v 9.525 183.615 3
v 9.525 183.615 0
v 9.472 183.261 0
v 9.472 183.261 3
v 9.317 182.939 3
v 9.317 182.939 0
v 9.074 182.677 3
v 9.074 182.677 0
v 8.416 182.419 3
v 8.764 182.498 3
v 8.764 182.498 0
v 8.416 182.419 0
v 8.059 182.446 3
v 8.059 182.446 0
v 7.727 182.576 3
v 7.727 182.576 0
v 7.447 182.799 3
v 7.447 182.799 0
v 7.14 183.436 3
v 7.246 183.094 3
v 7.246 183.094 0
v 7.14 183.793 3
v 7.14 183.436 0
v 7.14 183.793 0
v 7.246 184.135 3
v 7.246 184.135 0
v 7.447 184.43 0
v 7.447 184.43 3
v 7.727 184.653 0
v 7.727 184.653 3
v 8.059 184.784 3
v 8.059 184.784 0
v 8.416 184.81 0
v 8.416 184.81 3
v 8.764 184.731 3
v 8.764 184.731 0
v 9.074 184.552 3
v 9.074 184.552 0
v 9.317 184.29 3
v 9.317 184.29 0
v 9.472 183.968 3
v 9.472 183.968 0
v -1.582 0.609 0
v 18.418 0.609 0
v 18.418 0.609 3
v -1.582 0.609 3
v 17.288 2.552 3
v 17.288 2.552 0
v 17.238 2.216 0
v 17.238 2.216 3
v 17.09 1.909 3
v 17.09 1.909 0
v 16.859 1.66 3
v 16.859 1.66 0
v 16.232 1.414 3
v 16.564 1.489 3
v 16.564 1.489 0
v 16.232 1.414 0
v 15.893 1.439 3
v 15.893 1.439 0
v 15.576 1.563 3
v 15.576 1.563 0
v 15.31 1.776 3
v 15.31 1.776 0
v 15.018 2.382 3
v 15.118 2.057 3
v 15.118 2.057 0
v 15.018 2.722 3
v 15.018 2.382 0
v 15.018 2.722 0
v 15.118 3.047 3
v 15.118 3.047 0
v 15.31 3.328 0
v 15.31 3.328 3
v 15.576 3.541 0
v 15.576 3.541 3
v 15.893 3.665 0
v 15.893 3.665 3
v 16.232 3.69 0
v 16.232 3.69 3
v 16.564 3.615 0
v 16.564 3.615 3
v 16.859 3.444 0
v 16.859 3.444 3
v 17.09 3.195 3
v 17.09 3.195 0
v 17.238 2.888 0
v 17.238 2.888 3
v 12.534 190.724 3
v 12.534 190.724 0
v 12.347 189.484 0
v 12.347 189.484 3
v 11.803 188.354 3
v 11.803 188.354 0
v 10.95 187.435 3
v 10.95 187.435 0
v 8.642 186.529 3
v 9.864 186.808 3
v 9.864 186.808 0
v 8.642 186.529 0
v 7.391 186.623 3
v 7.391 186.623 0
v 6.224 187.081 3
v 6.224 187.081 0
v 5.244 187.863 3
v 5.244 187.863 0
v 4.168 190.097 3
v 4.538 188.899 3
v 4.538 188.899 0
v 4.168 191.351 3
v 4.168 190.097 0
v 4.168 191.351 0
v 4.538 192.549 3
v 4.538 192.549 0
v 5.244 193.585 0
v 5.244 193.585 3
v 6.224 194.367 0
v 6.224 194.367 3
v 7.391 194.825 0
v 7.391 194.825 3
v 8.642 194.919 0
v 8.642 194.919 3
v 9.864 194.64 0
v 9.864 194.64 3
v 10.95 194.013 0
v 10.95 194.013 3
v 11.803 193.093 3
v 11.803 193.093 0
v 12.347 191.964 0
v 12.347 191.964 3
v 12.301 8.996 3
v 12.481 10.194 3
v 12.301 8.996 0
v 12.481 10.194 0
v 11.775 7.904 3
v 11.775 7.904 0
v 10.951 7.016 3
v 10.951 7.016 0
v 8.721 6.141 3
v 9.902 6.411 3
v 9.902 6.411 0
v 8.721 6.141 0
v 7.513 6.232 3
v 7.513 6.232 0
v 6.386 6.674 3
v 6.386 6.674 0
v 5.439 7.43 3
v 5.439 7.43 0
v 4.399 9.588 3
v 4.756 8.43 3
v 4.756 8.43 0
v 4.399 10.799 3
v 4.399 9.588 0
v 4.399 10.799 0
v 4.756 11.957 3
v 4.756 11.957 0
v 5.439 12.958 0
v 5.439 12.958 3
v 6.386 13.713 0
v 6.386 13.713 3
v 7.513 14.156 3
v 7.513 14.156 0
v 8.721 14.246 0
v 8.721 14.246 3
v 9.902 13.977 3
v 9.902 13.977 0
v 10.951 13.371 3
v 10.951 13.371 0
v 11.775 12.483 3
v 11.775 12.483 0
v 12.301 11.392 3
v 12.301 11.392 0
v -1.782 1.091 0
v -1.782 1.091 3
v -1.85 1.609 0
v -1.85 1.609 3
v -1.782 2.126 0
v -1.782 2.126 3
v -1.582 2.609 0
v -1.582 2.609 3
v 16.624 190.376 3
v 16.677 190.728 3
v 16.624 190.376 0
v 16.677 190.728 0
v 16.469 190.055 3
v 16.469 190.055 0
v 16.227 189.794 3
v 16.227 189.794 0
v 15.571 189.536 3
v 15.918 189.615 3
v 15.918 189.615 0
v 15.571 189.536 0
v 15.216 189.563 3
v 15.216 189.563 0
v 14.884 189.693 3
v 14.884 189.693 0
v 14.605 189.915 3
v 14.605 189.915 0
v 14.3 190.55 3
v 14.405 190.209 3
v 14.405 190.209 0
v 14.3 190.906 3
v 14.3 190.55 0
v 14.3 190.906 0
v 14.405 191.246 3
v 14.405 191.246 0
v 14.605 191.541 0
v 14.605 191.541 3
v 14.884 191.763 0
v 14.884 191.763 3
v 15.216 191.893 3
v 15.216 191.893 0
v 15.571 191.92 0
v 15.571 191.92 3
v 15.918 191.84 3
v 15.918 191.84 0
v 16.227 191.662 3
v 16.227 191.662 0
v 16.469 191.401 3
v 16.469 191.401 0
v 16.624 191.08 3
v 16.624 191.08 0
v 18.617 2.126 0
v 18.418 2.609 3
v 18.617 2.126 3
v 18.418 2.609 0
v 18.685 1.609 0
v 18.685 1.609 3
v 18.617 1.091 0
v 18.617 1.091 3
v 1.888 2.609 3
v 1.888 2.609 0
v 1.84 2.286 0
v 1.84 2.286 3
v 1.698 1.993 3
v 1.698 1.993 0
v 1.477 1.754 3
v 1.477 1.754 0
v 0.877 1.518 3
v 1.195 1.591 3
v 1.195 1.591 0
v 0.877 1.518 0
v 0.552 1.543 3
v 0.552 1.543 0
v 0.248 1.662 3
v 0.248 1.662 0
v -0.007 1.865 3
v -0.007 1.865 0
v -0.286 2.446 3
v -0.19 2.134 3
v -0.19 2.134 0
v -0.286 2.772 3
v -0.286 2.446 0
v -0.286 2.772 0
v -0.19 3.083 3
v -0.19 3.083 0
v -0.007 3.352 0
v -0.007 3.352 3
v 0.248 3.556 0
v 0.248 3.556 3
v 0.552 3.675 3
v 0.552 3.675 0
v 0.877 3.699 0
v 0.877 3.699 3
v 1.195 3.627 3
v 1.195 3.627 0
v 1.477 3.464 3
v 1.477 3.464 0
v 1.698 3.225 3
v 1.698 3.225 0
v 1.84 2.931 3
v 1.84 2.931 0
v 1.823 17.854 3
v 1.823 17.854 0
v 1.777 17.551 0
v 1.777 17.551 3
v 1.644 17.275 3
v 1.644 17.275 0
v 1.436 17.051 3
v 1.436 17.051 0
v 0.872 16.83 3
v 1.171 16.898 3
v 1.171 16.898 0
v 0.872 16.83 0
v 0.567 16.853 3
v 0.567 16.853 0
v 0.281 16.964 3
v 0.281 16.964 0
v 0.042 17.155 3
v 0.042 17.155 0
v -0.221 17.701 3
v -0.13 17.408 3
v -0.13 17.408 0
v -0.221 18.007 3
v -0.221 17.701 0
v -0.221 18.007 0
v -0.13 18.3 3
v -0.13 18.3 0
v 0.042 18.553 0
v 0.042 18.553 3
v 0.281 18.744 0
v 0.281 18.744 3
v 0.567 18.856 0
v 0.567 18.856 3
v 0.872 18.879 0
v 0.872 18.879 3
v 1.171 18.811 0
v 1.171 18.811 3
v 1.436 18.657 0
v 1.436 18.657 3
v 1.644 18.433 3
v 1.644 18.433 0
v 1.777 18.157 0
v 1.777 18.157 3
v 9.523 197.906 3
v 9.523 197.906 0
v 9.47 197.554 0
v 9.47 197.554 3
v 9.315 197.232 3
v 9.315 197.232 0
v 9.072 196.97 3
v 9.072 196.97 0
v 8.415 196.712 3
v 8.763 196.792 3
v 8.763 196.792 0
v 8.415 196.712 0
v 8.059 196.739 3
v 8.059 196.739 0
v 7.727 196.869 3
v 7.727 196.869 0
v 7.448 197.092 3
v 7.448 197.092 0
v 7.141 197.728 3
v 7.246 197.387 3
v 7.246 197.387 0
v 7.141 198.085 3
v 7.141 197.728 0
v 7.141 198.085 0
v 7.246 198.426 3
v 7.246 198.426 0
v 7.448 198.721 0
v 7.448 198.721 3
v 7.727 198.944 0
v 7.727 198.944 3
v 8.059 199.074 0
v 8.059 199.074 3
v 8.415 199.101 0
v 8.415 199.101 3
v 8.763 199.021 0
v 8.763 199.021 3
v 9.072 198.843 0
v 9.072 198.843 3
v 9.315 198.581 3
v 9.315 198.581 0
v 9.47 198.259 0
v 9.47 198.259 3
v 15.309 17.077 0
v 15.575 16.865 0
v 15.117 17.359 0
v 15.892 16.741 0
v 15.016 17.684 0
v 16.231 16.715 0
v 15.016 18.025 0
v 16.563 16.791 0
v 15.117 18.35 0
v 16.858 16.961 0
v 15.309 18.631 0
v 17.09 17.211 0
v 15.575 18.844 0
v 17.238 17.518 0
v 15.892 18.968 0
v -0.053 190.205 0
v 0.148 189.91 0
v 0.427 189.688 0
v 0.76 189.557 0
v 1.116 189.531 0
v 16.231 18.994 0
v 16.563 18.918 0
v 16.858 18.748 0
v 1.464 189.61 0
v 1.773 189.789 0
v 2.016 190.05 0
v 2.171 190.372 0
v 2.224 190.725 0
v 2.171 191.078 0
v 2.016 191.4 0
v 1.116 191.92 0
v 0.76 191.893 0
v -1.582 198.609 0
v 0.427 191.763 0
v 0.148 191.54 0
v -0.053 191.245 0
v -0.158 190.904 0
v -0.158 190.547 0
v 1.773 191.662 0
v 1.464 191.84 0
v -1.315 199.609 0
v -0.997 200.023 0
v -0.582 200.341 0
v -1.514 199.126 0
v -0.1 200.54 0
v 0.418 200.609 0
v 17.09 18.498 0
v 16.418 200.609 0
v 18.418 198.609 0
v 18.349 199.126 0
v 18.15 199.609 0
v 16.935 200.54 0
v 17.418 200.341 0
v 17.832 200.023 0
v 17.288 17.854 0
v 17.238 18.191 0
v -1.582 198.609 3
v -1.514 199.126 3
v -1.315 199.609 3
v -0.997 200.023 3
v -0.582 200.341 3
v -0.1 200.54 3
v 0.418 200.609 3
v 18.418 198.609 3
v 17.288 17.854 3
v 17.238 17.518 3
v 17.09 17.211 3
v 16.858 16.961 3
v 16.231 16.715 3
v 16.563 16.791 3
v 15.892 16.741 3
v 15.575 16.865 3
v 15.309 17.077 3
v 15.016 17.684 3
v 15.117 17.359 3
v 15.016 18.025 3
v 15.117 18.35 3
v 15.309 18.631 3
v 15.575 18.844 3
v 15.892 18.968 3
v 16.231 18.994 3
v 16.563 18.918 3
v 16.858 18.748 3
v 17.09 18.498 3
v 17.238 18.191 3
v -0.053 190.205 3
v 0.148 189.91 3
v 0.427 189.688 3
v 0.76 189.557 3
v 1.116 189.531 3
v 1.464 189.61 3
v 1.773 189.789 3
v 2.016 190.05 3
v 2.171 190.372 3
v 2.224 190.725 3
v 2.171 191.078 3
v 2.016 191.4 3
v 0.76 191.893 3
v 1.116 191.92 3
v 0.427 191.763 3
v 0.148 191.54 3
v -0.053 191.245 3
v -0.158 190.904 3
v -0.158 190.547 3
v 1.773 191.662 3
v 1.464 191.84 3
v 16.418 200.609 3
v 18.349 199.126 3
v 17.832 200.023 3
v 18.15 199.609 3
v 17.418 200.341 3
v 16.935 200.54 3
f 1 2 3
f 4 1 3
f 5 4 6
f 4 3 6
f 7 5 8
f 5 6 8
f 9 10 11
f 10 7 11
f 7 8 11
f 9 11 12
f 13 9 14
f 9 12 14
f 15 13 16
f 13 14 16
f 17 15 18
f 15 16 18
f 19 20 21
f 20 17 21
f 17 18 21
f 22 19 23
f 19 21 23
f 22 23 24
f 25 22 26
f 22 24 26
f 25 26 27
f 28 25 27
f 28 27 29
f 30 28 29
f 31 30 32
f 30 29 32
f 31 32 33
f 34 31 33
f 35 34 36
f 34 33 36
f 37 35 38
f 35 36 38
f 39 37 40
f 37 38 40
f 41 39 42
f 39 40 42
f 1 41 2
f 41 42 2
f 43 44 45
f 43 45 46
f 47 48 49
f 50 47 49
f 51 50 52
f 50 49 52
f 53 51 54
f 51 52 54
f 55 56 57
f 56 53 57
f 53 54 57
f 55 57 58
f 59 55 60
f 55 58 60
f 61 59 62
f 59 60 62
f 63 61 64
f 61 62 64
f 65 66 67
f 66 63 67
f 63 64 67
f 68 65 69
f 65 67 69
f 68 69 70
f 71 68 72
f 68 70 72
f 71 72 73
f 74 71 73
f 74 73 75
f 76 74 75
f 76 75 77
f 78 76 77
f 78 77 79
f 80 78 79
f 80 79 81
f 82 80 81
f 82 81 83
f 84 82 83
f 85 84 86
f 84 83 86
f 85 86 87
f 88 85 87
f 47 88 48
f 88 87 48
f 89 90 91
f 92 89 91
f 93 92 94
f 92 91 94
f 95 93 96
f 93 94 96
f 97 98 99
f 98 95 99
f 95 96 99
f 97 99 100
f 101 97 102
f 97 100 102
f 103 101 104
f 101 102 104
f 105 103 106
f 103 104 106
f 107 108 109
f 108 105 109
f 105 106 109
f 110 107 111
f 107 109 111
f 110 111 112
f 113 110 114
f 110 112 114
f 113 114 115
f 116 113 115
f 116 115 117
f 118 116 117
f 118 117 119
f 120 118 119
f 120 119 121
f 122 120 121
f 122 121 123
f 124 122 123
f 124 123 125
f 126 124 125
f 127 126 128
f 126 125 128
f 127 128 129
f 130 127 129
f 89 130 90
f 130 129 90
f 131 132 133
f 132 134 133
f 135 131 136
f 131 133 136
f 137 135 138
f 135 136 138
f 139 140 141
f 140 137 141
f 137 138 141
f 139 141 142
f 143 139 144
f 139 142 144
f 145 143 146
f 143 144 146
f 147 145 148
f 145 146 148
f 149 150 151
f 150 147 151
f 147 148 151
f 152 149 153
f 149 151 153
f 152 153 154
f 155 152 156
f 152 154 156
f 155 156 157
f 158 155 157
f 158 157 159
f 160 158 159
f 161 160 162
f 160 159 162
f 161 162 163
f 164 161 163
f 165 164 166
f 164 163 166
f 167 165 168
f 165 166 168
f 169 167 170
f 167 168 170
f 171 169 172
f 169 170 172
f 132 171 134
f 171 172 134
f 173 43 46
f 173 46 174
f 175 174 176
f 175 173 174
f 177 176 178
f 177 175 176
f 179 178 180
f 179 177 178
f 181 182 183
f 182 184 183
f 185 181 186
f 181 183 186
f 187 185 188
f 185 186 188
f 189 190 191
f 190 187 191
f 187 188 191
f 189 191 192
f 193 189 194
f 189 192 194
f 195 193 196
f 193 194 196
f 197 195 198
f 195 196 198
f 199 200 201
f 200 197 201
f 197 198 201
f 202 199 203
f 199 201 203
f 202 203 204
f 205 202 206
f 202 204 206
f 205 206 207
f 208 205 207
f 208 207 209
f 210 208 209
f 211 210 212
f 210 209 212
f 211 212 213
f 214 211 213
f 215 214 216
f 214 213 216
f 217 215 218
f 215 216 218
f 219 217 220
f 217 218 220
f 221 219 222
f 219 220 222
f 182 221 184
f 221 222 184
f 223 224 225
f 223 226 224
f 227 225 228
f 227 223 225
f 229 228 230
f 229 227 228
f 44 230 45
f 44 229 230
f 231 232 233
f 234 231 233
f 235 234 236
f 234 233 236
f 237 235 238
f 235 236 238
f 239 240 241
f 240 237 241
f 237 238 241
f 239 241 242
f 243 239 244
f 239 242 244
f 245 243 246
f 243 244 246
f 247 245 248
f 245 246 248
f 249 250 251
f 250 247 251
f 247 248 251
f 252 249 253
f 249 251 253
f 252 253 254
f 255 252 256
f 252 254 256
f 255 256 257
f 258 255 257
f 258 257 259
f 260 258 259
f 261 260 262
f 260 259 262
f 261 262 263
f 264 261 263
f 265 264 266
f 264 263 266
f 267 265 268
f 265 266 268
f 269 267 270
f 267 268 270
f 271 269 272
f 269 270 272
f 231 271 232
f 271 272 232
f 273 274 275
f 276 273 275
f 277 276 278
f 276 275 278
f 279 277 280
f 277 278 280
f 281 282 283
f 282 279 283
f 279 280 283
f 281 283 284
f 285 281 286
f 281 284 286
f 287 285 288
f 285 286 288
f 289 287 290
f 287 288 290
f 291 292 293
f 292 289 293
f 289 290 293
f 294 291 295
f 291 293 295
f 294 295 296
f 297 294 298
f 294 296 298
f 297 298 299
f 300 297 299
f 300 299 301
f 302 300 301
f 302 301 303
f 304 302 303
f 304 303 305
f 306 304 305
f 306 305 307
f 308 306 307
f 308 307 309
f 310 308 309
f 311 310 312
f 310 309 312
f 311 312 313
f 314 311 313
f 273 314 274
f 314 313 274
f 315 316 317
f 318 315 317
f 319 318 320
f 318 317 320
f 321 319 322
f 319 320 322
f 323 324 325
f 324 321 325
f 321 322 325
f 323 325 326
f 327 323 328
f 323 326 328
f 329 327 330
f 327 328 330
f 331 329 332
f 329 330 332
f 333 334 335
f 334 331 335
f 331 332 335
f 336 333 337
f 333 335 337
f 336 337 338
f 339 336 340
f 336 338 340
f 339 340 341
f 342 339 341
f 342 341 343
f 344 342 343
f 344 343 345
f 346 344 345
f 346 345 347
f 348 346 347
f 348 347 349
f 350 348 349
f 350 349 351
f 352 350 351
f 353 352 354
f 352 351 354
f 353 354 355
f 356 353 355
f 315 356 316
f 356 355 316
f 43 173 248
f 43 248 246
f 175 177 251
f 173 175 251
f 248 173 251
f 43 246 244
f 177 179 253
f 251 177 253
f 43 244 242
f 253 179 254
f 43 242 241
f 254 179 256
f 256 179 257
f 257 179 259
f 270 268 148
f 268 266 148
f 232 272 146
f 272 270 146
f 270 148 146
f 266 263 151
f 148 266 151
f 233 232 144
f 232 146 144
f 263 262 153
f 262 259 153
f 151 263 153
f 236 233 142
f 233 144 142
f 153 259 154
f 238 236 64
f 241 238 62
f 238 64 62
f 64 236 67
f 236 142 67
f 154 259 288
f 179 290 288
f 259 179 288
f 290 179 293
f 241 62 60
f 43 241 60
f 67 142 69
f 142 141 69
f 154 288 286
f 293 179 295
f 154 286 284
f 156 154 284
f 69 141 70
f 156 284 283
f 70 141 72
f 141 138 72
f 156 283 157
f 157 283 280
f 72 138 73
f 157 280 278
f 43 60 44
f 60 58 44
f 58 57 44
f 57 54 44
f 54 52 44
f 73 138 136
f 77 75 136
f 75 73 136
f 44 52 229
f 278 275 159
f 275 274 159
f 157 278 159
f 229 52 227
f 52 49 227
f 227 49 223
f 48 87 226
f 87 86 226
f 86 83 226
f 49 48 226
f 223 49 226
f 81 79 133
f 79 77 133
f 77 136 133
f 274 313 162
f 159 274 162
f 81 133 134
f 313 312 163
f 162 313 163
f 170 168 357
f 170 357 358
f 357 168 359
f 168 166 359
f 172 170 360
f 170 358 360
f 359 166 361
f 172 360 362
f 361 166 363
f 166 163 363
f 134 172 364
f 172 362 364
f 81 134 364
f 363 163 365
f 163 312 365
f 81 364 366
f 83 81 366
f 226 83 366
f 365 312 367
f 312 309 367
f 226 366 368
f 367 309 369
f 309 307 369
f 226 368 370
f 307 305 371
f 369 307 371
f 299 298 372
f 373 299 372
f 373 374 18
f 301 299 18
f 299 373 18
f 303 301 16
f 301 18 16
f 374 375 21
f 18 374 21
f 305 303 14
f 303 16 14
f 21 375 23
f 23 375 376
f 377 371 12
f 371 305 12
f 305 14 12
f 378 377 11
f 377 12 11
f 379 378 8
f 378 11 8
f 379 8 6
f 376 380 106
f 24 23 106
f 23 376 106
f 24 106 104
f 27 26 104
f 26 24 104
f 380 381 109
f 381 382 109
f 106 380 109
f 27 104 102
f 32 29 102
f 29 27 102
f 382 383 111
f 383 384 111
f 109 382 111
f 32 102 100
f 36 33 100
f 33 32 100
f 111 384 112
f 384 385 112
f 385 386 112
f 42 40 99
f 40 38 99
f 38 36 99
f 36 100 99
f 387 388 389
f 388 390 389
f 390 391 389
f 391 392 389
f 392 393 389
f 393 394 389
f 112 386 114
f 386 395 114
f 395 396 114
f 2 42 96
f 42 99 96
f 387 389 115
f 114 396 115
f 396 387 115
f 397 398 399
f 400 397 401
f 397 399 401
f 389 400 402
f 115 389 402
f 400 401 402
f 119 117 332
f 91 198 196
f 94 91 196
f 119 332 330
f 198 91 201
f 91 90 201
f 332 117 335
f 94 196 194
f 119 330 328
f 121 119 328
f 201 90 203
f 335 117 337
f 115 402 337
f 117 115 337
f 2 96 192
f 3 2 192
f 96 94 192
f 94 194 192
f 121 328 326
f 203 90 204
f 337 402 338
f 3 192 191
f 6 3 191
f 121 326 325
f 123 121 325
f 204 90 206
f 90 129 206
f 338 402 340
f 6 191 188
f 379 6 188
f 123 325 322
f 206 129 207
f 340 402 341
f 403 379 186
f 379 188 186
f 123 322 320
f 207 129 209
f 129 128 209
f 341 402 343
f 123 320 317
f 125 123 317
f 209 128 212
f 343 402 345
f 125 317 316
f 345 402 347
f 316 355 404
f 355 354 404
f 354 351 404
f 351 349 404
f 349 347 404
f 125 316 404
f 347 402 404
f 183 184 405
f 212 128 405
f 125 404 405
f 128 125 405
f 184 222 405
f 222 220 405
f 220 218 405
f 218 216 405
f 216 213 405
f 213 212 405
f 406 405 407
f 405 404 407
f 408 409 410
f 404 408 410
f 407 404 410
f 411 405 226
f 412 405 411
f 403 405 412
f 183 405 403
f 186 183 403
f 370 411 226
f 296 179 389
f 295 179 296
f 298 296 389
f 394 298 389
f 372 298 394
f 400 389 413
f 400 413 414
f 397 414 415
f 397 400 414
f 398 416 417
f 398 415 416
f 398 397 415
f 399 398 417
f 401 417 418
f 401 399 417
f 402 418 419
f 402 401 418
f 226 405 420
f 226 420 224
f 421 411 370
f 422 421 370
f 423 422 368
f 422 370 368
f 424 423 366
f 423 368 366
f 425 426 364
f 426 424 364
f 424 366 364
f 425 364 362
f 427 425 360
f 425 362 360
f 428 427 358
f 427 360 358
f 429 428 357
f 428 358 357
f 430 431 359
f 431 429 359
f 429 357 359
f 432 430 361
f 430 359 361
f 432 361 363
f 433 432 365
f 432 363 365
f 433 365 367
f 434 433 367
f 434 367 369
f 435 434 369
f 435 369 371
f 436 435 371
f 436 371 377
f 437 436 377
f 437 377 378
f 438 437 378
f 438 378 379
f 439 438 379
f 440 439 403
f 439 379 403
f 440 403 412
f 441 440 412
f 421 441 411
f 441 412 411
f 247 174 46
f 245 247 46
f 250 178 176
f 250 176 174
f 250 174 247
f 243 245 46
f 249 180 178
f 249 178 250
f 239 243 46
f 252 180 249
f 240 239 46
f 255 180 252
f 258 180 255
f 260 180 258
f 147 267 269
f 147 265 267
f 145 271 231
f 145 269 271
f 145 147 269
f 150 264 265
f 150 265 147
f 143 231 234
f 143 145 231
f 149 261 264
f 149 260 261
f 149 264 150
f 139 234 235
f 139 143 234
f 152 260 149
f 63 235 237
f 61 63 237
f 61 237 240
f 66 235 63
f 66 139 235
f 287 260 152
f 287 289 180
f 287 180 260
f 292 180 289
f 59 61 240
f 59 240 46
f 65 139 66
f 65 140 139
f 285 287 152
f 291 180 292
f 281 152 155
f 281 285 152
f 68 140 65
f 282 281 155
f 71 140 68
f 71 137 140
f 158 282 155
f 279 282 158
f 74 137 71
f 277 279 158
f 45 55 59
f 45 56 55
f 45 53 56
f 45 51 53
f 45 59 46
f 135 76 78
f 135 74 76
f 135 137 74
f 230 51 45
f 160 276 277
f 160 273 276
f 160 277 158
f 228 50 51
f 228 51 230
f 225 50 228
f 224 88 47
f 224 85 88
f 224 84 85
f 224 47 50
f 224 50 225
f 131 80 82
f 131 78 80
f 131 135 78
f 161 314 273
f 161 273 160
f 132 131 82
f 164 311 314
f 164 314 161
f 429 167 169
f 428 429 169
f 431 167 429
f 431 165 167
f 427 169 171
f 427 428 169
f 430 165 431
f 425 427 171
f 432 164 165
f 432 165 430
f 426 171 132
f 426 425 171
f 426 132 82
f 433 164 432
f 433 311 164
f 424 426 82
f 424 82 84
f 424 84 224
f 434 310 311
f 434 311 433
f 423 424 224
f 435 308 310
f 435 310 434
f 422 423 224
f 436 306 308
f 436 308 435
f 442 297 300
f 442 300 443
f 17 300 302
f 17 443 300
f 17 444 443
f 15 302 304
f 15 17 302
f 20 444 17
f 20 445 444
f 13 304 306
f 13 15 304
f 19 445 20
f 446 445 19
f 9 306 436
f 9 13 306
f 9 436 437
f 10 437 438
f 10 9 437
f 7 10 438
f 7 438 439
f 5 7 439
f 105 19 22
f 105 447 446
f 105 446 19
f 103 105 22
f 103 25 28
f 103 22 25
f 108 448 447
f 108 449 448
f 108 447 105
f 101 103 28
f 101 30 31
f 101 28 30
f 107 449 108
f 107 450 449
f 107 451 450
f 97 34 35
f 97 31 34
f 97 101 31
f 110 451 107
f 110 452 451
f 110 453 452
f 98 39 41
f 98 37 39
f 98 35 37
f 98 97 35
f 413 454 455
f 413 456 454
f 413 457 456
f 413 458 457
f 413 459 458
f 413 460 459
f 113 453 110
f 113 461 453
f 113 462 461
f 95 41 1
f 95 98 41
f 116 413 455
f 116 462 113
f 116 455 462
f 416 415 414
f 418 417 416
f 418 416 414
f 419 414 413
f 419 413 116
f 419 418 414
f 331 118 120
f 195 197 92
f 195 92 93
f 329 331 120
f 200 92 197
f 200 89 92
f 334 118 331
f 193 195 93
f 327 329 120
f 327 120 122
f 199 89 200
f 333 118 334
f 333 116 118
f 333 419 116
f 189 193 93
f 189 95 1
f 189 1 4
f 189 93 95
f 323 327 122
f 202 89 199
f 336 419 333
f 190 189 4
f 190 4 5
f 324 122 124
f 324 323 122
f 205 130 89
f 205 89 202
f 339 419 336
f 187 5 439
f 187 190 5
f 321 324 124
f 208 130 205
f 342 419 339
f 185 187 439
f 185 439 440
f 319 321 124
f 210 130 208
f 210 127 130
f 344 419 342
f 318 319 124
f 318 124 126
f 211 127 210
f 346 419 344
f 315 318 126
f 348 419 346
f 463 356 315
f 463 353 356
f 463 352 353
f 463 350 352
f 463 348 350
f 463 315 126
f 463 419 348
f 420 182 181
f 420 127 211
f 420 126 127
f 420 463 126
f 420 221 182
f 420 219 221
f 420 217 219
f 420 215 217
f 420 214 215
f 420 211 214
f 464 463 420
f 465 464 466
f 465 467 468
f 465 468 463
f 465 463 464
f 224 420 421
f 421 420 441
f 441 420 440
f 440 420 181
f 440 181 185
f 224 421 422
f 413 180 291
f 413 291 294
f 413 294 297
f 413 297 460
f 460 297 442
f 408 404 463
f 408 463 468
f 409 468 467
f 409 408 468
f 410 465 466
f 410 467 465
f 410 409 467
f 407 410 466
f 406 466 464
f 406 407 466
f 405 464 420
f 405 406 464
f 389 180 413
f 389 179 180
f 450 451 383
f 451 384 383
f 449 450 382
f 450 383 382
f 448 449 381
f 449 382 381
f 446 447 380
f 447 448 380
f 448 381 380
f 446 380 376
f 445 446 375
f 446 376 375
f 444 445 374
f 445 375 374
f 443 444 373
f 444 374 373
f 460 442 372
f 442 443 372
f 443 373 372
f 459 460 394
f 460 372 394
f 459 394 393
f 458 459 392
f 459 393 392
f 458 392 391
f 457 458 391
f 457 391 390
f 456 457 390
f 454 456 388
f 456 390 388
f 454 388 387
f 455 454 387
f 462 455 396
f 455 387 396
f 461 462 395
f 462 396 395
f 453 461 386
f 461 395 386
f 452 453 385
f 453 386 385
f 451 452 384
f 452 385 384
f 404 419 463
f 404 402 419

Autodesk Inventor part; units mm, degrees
ref_plane "YZ Plane" through (0, 0, 0) normal (1, 0, 0) x (0, 1, 0)
ref_plane "XZ Plane" through (0, 0, 0) normal (0, 1, 0) x (-1, 0, 0)
ref_plane "XY Plane" through (0, 0, 0) normal (0, 0, 1) x (1, 0, 0)
ref_plane "РабПлоскость1" through (0, 0, 0) normal (0, 0, 1) x (1, 0, 0)
sketch "Эскиз1" plane through (0, 0, 0) normal (0, 0, 1) x (1, 0, 0)
  line L0 (0.4175, 200.6086) -> (16.4175, 200.6086)
  line L1 (18.4175, 198.6086) -> (18.4175, 2.6086)
  line L2 (18.4175, 0.6086) -> (-1.5825, 0.6086)
  line L3 (-1.5825, 2.6086) -> (-1.5825, 198.6086)
  circle A0 centre (16.146, 17.8544) radius 1.1424
  circle A1 centre (16.1468, 2.552) radius 1.1415
  circle A2 centre (8.4175, 10.1937) radius 4.0638
  circle A3 centre (0.795, 2.6086) radius 1.0935
  circle A4 centre (0.7952, 17.8542) radius 1.0274
  line L4 (8.4175, 200.6086) -> (8.4175, 0.6086) construction
  arc A5 (18.4175, 0.6086) -> (18.4175, 2.6086) centre (16.6855, 1.6086) ccw
  arc A6 (-1.5825, 2.6086) -> (-1.5825, 0.6086) centre (0.1496, 1.6086) ccw
  circle A7 centre (8.3261, 183.6146) radius 1.1991 projected
  circle A8 centre (15.4815, 190.7279) radius 1.1951 projected
  circle A9 centre (8.3254, 197.9065) radius 1.1975 projected
  circle A10 centre (1.0262, 190.7251) radius 1.1979 projected
  circle A11 centre (8.3275, 190.7238) radius 4.2065 projected
  arc A12 (0.4175, 200.6086) -> (-1.5825, 198.6086) centre (0.4175, 198.6086) ccw
  arc A13 (18.4175, 198.6086) -> (16.4175, 200.6086) centre (16.4175, 198.6086) ccw
  point P0 (18.4175, 0.6086)
  point P1 (18.4175, 200.6086)
  point P2 (-1.5825, 0.6086)
  dimension "d0" = 200
  dimension "d1" = 20
  dimension "d3" = 2
  dimension "d4" = 2
  dimension "d5" = 2
extrude "Выдавливание1" add sketch "Эскиз1" along normal blind 3
properties part number "рука"
